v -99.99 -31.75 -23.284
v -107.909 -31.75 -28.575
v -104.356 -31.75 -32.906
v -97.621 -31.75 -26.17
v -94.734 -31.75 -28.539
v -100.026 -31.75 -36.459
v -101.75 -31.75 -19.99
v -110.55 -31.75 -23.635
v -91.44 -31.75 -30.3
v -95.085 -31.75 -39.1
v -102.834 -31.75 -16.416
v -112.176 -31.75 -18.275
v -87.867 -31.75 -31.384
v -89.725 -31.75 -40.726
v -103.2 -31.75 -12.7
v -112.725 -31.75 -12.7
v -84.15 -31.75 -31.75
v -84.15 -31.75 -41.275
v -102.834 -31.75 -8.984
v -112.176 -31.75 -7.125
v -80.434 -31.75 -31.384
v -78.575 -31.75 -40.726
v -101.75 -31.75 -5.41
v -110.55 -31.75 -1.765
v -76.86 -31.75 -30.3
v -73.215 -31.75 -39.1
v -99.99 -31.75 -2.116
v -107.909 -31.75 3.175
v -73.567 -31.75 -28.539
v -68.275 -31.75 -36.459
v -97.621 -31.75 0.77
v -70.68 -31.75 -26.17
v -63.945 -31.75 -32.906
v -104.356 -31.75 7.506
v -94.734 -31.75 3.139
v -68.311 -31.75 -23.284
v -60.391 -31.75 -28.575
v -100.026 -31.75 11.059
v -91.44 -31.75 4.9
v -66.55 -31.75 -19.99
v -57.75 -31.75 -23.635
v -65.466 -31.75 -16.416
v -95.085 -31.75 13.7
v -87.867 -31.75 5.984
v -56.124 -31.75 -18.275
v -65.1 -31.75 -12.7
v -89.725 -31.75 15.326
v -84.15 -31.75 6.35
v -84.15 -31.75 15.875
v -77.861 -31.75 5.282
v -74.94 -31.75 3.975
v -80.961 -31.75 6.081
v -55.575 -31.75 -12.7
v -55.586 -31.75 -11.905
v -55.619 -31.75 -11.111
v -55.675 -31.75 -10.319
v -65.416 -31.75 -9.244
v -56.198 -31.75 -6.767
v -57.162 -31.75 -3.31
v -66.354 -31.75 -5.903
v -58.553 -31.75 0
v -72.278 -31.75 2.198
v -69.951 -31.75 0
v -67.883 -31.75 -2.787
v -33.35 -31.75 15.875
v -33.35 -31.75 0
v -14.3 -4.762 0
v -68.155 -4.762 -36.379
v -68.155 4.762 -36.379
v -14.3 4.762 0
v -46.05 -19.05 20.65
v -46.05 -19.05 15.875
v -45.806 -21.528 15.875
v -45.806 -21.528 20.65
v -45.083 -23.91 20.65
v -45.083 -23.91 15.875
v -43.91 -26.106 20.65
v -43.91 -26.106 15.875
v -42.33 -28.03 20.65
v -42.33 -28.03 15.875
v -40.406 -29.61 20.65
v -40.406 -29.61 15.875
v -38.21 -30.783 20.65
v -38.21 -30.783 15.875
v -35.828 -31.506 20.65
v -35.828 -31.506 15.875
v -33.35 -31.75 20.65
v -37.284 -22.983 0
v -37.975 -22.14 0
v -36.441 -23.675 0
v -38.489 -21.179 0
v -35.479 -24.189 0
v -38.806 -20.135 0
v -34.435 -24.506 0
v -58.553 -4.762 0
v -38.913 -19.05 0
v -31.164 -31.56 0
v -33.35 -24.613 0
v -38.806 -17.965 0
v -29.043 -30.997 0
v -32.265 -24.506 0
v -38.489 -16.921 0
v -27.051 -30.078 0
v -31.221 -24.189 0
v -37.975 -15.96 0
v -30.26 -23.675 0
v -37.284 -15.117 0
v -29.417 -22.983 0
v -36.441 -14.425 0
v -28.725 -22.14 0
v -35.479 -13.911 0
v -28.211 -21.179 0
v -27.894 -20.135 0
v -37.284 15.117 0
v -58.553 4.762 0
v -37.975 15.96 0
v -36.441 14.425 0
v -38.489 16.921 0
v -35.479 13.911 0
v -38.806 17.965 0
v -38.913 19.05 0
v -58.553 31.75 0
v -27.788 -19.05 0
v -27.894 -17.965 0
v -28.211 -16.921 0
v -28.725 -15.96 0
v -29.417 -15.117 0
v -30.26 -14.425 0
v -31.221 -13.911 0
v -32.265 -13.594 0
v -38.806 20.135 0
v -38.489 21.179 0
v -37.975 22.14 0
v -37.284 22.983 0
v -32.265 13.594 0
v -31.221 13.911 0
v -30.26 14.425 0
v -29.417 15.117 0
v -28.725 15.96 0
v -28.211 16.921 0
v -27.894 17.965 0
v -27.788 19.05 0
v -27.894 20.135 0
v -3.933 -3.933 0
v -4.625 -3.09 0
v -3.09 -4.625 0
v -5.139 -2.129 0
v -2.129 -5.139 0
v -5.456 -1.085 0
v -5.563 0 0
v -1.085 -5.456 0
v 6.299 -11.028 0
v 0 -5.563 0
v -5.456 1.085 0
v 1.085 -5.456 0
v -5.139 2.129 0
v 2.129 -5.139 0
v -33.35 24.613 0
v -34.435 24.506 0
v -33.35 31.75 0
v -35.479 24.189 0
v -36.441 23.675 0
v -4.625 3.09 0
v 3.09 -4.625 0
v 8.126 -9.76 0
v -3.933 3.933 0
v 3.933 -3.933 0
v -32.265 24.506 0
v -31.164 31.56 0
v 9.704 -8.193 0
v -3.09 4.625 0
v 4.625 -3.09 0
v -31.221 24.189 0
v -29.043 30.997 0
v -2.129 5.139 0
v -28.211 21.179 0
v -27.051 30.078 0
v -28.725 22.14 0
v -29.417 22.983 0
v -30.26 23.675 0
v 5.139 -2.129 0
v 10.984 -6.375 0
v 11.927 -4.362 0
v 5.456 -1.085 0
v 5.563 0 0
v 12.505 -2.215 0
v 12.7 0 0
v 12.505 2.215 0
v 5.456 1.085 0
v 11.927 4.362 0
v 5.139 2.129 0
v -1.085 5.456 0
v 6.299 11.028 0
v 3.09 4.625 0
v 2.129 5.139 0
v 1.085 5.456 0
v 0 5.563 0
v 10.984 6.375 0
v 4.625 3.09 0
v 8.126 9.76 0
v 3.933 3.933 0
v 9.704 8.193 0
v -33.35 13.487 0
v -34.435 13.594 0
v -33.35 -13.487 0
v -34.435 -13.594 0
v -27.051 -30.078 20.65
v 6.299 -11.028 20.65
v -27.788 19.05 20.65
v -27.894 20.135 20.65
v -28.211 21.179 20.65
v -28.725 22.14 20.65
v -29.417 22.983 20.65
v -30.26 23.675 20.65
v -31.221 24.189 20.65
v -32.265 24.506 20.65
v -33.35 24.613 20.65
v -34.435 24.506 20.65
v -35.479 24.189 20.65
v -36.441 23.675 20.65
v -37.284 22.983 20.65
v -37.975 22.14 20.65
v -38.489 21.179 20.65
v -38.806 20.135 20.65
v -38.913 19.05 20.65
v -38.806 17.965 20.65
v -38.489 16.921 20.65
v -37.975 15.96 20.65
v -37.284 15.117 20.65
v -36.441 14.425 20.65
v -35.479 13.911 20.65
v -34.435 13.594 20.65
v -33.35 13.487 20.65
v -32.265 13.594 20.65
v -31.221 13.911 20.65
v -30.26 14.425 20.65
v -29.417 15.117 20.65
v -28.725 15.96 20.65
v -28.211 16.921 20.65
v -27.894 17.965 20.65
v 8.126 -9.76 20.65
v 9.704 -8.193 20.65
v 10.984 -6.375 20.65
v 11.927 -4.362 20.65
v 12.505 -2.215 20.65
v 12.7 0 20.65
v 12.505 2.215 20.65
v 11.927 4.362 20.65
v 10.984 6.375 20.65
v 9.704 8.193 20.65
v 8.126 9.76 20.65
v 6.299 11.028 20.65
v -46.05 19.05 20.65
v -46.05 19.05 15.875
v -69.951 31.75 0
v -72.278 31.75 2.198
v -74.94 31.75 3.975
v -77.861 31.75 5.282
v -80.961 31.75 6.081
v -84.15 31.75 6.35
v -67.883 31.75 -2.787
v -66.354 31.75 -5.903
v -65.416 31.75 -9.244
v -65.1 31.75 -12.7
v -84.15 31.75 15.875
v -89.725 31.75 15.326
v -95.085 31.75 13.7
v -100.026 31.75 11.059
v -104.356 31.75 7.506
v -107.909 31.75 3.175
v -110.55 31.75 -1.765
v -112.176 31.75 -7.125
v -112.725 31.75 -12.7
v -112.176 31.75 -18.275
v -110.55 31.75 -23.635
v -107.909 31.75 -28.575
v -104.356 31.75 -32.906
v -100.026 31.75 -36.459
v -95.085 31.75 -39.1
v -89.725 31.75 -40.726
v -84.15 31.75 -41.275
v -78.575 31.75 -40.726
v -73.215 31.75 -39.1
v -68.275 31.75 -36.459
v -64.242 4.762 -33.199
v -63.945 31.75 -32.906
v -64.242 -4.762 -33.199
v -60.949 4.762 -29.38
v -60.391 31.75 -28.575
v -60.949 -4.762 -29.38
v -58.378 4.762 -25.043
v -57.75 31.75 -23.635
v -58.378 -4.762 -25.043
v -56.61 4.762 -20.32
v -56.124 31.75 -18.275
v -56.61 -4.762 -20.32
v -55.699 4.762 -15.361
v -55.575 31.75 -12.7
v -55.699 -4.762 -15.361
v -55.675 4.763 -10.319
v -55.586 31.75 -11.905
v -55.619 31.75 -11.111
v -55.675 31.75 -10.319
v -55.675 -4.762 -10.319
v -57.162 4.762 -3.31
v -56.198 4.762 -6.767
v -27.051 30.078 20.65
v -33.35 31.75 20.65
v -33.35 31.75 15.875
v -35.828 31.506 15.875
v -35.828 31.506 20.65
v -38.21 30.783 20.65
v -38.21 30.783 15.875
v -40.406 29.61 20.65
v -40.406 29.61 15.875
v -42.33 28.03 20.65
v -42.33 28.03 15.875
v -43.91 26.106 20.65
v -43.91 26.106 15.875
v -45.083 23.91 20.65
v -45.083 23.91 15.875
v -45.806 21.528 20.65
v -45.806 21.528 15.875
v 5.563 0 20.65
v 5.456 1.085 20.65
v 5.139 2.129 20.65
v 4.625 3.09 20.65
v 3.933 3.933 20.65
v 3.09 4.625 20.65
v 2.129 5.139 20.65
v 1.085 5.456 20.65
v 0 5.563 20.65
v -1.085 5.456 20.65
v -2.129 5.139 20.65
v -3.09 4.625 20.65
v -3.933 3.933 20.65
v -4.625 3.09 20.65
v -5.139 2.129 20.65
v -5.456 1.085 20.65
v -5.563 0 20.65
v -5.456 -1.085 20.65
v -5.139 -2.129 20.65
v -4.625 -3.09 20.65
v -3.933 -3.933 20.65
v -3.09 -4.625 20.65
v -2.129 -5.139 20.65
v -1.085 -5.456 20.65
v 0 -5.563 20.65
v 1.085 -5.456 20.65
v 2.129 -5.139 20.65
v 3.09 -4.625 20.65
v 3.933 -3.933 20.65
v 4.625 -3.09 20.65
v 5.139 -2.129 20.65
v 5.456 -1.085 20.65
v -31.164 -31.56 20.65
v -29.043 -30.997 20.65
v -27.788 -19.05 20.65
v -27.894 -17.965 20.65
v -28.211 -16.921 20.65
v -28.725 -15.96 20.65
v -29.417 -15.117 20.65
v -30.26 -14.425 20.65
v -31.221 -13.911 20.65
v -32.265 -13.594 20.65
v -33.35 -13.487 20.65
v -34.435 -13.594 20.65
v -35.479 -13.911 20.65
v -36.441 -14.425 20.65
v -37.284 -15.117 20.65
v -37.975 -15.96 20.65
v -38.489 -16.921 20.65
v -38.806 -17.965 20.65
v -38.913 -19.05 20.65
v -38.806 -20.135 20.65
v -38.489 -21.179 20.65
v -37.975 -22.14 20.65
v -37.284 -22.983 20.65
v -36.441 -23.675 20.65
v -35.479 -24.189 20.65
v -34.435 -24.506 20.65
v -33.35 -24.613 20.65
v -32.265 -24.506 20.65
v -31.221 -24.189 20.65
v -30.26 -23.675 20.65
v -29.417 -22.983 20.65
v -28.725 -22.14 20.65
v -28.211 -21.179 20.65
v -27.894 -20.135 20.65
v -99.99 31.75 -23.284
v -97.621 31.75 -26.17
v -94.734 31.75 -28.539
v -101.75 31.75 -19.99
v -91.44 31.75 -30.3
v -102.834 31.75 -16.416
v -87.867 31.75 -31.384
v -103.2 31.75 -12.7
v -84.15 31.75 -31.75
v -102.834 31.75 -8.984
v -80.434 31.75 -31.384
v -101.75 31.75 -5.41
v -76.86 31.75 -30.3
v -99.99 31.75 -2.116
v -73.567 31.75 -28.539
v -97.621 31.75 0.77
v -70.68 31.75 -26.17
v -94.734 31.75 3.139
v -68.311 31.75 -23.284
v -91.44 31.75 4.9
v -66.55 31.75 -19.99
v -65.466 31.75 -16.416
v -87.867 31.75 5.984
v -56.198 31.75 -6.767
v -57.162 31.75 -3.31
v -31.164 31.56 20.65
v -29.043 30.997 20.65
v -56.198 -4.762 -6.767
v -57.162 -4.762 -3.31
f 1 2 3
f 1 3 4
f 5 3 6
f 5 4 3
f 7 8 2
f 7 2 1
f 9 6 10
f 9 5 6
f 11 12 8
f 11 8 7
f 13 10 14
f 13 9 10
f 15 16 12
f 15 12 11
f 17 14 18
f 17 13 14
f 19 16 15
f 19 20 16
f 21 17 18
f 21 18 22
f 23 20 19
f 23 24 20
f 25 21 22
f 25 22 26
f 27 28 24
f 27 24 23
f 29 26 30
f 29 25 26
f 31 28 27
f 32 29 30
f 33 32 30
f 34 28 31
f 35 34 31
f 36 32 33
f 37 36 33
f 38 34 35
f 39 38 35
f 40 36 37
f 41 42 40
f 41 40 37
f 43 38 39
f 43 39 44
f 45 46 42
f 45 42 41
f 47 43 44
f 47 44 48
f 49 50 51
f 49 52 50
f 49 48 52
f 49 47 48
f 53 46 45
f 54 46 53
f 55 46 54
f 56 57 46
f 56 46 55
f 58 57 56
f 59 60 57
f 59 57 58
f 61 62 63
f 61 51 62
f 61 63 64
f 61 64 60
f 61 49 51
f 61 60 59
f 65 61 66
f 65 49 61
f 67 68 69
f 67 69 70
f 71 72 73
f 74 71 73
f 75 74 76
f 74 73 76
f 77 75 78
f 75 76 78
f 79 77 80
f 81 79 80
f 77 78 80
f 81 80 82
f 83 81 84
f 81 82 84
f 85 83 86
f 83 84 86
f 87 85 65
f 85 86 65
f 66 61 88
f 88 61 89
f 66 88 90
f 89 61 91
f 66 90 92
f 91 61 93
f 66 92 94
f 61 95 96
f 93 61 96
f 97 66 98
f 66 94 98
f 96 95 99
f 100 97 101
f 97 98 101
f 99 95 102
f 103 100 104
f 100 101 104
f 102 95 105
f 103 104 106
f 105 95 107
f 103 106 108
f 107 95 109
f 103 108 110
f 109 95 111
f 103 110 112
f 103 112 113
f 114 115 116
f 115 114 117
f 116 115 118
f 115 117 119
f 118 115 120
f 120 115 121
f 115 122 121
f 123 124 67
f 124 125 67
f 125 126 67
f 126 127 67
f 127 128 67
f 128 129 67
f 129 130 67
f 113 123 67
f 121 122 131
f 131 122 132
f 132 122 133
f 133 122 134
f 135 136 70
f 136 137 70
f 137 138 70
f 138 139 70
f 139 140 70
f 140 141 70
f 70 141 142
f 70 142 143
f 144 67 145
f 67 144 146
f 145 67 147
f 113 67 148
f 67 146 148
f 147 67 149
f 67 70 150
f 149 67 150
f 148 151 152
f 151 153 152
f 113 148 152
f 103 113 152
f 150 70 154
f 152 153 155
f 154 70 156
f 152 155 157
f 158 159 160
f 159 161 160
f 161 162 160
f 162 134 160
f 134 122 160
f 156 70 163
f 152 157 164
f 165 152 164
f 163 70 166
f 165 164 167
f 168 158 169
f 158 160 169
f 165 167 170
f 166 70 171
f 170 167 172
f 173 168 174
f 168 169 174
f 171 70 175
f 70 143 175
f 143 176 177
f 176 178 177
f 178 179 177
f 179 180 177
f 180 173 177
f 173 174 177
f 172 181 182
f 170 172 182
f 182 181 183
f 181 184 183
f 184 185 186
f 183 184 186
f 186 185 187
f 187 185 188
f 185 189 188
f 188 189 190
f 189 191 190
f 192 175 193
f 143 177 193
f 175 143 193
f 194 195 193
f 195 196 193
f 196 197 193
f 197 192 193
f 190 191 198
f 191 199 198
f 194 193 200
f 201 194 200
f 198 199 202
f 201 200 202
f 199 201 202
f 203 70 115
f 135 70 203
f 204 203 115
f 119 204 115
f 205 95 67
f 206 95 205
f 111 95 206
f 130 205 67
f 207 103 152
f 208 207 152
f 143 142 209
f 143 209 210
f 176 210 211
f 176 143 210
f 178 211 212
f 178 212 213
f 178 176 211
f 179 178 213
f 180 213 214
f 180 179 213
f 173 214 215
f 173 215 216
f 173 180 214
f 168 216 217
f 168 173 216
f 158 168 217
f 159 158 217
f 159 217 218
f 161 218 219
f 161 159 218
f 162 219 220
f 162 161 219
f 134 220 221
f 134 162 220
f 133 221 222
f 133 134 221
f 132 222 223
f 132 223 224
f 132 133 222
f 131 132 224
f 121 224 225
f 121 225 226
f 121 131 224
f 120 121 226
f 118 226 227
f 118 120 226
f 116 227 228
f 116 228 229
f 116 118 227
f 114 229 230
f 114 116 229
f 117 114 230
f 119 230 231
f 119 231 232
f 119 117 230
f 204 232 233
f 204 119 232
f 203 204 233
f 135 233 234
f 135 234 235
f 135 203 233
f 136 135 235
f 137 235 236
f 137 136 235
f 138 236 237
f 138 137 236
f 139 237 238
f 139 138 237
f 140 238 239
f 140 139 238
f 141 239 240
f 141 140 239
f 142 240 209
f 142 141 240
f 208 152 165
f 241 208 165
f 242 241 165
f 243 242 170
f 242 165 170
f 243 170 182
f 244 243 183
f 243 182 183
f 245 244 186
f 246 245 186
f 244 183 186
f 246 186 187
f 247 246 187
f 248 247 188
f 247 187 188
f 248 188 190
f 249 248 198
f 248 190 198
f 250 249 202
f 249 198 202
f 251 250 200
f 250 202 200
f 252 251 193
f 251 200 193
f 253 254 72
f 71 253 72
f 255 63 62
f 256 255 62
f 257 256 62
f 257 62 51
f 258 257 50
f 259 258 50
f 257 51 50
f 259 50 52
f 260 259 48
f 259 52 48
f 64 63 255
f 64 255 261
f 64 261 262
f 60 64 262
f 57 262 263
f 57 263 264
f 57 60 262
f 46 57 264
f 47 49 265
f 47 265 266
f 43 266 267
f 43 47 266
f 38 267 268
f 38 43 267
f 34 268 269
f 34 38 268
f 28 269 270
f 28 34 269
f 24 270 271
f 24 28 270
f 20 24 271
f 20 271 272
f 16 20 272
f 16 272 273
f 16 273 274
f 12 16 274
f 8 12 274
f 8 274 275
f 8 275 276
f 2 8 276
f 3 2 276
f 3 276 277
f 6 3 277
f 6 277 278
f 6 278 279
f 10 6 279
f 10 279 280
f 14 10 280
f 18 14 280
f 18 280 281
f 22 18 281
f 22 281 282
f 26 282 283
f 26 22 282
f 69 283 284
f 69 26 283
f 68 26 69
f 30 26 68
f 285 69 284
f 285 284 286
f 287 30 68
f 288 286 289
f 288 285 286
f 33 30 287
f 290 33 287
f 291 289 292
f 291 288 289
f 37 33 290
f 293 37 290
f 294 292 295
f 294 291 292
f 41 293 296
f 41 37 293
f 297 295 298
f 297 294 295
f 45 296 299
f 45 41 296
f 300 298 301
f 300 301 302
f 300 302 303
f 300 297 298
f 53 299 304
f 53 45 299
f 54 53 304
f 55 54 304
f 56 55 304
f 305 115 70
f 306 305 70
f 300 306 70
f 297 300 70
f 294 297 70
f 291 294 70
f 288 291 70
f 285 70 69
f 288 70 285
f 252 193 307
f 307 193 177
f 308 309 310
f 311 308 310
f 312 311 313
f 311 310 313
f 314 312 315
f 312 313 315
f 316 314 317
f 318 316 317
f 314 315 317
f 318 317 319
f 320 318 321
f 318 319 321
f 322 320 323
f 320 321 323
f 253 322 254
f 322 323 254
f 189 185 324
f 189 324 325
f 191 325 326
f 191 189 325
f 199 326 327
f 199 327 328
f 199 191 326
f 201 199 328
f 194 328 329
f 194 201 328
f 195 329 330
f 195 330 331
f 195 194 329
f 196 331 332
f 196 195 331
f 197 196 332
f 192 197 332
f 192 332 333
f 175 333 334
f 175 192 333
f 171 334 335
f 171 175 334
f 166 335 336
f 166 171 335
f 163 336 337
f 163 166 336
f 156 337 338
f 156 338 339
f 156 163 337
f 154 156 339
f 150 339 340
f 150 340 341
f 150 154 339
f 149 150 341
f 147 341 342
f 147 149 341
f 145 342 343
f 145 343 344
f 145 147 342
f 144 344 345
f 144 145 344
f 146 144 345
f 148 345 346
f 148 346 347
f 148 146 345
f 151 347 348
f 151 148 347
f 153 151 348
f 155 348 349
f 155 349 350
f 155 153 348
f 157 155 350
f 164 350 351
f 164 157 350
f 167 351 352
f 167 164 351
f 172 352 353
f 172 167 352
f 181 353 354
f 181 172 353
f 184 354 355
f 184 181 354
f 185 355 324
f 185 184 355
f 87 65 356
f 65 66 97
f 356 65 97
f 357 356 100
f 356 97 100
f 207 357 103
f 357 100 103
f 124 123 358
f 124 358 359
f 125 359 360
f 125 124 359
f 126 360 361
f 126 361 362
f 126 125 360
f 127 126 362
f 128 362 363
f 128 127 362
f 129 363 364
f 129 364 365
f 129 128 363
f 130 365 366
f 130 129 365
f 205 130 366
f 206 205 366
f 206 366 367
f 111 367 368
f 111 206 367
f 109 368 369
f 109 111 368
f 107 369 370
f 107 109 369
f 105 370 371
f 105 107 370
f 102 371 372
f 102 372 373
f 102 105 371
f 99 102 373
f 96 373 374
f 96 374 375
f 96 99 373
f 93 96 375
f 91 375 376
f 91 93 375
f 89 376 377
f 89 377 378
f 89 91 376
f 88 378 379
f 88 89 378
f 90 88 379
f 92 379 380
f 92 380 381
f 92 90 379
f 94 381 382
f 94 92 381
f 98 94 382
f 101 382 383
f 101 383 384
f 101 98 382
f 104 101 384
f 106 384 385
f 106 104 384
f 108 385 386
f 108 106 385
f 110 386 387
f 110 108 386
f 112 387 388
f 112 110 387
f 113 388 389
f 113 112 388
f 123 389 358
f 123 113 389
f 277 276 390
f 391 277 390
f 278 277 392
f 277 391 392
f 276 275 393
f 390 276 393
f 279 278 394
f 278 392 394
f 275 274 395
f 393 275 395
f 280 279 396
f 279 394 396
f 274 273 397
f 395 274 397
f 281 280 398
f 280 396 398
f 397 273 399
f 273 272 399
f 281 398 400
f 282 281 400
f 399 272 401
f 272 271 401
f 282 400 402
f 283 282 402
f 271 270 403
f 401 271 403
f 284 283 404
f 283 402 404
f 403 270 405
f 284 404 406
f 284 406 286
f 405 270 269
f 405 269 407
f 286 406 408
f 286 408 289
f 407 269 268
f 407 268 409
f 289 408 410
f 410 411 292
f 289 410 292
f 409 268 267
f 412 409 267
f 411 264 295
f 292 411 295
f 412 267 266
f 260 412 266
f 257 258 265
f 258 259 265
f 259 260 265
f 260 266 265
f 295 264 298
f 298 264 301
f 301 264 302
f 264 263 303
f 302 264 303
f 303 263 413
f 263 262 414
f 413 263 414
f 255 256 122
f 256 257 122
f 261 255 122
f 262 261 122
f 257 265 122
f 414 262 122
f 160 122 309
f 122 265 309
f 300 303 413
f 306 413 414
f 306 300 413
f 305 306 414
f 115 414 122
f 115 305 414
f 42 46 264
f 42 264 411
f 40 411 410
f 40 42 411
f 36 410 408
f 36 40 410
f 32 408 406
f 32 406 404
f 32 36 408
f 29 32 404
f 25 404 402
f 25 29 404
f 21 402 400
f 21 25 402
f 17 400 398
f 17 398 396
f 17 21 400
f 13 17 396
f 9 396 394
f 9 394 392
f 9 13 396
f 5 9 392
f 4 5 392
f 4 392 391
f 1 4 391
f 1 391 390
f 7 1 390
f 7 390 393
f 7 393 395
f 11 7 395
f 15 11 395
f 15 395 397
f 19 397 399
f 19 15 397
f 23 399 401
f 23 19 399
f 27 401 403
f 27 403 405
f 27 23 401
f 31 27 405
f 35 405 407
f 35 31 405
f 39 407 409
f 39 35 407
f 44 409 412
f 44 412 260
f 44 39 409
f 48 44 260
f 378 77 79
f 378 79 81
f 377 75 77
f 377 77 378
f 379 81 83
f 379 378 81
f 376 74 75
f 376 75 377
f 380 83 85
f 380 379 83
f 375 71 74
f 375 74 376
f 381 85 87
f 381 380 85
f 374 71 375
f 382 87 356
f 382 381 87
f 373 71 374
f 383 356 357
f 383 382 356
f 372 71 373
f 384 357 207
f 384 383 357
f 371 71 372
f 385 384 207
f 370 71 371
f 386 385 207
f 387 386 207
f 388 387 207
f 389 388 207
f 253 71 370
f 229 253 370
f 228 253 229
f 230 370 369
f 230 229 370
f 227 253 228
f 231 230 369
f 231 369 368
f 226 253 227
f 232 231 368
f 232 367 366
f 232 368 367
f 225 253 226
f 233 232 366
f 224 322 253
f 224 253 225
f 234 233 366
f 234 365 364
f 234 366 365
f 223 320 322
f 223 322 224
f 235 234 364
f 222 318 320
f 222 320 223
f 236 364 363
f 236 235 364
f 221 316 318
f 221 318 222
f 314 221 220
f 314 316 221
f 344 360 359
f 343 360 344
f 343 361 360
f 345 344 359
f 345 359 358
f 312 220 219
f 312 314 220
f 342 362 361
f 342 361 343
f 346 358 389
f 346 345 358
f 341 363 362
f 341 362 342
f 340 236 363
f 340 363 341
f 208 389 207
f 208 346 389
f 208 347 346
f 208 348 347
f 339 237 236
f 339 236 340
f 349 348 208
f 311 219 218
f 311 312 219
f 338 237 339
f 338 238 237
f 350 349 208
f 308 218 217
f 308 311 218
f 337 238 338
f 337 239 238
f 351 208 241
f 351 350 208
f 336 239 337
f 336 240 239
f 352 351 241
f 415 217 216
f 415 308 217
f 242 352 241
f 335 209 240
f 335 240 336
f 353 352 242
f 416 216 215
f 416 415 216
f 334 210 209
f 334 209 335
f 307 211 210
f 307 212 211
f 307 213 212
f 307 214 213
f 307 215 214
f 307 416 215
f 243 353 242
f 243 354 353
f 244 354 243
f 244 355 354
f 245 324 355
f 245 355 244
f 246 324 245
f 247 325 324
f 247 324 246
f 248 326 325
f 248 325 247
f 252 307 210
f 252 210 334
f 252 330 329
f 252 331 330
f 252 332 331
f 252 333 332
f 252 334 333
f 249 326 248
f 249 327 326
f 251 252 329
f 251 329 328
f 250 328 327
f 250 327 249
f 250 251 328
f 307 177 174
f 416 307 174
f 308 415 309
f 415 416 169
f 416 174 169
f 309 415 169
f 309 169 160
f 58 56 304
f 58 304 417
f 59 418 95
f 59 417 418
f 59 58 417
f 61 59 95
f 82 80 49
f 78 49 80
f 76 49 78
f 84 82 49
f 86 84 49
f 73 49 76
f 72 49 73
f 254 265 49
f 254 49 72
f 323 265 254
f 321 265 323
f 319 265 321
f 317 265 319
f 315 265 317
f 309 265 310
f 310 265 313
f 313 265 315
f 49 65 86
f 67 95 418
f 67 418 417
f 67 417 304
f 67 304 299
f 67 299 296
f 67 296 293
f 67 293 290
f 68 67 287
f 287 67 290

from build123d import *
from build123d import SkipClean  # not in build123d's __all__

# Parameters (mm, degrees)
F0_R     = 5.5626
F1_DEPTH = 20.6502
F2_DEPTH = 15.875
F4_DEPTH = 31.75
F6_DEPTH = 4.7625
F8_DEPTH = 381


with BuildPart() as f1:
    # F0 (on Top) → F1 (new body)
    with BuildSketch(Plane.XY):
        with BuildLine():
            ThreePointArc((6.2991554441, -11.0277214642), (-12.7, 0), (6.2991554441, 11.0277214642))
            Line((6.2991554441, 11.0277214642), (-27.0510445559, 30.0777214642))
            ThreePointArc((-27.0510445559, 30.0777214642), (-22.3663647377, 25.4253715915), (-20.6502, 19.05))
            ThreePointArc((-20.6502, 19.05), (-33.3502, 6.35), (-46.0502, 19.05))
            Line((-46.0502, 19.05), (-46.0502, -19.05))
            ThreePointArc((-46.0502, -19.05), (-33.3502, -6.35), (-20.6502, -19.05))
            ThreePointArc((-20.6502, -19.05), (-22.3663647377, -25.4253715915), (-27.0510445559, -30.0777214642))
            Line((-27.0510445559, -30.0777214642), (6.2991554441, -11.0277214642))
        make_face()
        with BuildLine():
            ThreePointArc((-20.6502, 19.05), (-22.3663647377, 25.4253715915), (-27.0510445559, 30.0777214642))
            ThreePointArc((-27.0510445559, 30.0777214642), (-30.0915240875, 31.3248128824), (-33.3502, 31.75))
            ThreePointArc((-33.3502, 31.75), (-42.3304561211, 28.0302561211), (-46.0502, 19.05))
            ThreePointArc((-46.0502, 19.05), (-33.3502, 6.35), (-20.6502, 19.05))
        make_face()
        with Locations((-33.3502, 19.05)):
            Circle(F0_R, mode=Mode.SUBTRACT)
        with BuildLine():
            ThreePointArc((6.2991554441, -11.0277214642), (10.9838352623, -6.3753715915), (12.7, 0))
            ThreePointArc((12.7, 0), (10.9838352623, 6.3753715915), (6.2991554441, 11.0277214642))
            ThreePointArc((6.2991554441, 11.0277214642), (-12.7, 0), (6.2991554441, -11.0277214642))
        make_face()
        Circle(F0_R, mode=Mode.SUBTRACT)
        with BuildLine():
            ThreePointArc((-33.3502, -31.75), (-30.0915240875, -31.3248128824), (-27.0510445559, -30.0777214642))
            ThreePointArc((-27.0510445559, -30.0777214642), (-22.3663647377, -25.4253715915), (-20.6502, -19.05))
            ThreePointArc((-20.6502, -19.05), (-33.3502, -6.35), (-46.0502, -19.05))
            ThreePointArc((-46.0502, -19.05), (-42.3304561211, -28.0302561211), (-33.3502, -31.75))
        make_face()
        with Locations((-33.3502, -19.05)):
            Circle(F0_R, mode=Mode.SUBTRACT)
    extrude(amount=F1_DEPTH)

    # F0 (on Top) → F2 (join)
    with BuildSketch(Plane.XY):
        with BuildLine():
            ThreePointArc((-46.0502, 19.05), (-42.3304561211, 28.0302561211), (-33.3502, 31.75))
            Line((-33.3502, 31.75), (-84.1502, 31.75))
            Line((-84.1502, 31.75), (-84.1502, -31.75))
            Line((-84.1502, -31.75), (-33.3502, -31.75))
            ThreePointArc((-33.3502, -31.75), (-42.3304561211, -28.0302561211), (-46.0502, -19.05))
            Line((-46.0502, -19.05), (-46.0502, 19.05))
        make_face()
    extrude(amount=F2_DEPTH)

    # F3 (on Front) → F4 (join, symmetric)
    with BuildSketch(Plane.XZ):
        with BuildLine():
            ThreePointArc((-55.6745916055, -10.31875), (-56.6256842933, -5.0233040887), (-58.5525316492, 0))
            Line((-58.5525316492, 0), (-69.9511683429, 0))
            ThreePointArc((-69.9511683429, 0), (-66.3542165618, -5.9025391898), (-65.1002, -12.7))
            ThreePointArc((-65.1002, -12.7), (-97.6205841816, -26.1703841816), (-84.1502, 6.35))
            Line((-84.1502, 6.35), (-84.1502, 15.875))
            ThreePointArc((-84.1502, 15.875), (-104.3557762724, -32.9055762724), (-55.5752, -12.7))
            ThreePointArc((-55.5752, -12.7), (-55.6000587142, -11.5083383184), (-55.6745916055, -10.31875))
        make_face()
    extrude(amount=F4_DEPTH, both=True)

    # F5 (on Front) → F6 (join, symmetric)
    with BuildSketch(Plane.XZ):
        with BuildLine():
            ThreePointArc((-58.5525316492, 0), (-56.5215204273, -19.9929205446), (-68.1551747025, -36.3788891364))
            Line((-68.1551747025, -36.3788891364), (-14.3002, 0))
            Line((-14.3002, 0), (-58.5525316492, 0))
        make_face()
    extrude(amount=F6_DEPTH, both=True)

    # F7 (on face) → F8 (cut, symmetric)
    with BuildSketch(Plane.XZ.offset(31.75)):
        with BuildLine():
            ThreePointArc((-69.9511683429, 0), (-76.3730700667, 4.6901912008), (-84.1502, 6.35))
            ThreePointArc((-84.1502, 6.35), (-97.6205841816, -26.1703841816), (-65.1002, -12.7))
            ThreePointArc((-65.1002, -12.7), (-66.3542165618, -5.9025391898), (-69.9511683429, 0))
        make_face()
    with SkipClean():  # cleaning this boolean's faces spoils the solid; the shape is the same uncleaned
        extrude(amount=F8_DEPTH, both=True, mode=Mode.SUBTRACT)


solid = f1.part
